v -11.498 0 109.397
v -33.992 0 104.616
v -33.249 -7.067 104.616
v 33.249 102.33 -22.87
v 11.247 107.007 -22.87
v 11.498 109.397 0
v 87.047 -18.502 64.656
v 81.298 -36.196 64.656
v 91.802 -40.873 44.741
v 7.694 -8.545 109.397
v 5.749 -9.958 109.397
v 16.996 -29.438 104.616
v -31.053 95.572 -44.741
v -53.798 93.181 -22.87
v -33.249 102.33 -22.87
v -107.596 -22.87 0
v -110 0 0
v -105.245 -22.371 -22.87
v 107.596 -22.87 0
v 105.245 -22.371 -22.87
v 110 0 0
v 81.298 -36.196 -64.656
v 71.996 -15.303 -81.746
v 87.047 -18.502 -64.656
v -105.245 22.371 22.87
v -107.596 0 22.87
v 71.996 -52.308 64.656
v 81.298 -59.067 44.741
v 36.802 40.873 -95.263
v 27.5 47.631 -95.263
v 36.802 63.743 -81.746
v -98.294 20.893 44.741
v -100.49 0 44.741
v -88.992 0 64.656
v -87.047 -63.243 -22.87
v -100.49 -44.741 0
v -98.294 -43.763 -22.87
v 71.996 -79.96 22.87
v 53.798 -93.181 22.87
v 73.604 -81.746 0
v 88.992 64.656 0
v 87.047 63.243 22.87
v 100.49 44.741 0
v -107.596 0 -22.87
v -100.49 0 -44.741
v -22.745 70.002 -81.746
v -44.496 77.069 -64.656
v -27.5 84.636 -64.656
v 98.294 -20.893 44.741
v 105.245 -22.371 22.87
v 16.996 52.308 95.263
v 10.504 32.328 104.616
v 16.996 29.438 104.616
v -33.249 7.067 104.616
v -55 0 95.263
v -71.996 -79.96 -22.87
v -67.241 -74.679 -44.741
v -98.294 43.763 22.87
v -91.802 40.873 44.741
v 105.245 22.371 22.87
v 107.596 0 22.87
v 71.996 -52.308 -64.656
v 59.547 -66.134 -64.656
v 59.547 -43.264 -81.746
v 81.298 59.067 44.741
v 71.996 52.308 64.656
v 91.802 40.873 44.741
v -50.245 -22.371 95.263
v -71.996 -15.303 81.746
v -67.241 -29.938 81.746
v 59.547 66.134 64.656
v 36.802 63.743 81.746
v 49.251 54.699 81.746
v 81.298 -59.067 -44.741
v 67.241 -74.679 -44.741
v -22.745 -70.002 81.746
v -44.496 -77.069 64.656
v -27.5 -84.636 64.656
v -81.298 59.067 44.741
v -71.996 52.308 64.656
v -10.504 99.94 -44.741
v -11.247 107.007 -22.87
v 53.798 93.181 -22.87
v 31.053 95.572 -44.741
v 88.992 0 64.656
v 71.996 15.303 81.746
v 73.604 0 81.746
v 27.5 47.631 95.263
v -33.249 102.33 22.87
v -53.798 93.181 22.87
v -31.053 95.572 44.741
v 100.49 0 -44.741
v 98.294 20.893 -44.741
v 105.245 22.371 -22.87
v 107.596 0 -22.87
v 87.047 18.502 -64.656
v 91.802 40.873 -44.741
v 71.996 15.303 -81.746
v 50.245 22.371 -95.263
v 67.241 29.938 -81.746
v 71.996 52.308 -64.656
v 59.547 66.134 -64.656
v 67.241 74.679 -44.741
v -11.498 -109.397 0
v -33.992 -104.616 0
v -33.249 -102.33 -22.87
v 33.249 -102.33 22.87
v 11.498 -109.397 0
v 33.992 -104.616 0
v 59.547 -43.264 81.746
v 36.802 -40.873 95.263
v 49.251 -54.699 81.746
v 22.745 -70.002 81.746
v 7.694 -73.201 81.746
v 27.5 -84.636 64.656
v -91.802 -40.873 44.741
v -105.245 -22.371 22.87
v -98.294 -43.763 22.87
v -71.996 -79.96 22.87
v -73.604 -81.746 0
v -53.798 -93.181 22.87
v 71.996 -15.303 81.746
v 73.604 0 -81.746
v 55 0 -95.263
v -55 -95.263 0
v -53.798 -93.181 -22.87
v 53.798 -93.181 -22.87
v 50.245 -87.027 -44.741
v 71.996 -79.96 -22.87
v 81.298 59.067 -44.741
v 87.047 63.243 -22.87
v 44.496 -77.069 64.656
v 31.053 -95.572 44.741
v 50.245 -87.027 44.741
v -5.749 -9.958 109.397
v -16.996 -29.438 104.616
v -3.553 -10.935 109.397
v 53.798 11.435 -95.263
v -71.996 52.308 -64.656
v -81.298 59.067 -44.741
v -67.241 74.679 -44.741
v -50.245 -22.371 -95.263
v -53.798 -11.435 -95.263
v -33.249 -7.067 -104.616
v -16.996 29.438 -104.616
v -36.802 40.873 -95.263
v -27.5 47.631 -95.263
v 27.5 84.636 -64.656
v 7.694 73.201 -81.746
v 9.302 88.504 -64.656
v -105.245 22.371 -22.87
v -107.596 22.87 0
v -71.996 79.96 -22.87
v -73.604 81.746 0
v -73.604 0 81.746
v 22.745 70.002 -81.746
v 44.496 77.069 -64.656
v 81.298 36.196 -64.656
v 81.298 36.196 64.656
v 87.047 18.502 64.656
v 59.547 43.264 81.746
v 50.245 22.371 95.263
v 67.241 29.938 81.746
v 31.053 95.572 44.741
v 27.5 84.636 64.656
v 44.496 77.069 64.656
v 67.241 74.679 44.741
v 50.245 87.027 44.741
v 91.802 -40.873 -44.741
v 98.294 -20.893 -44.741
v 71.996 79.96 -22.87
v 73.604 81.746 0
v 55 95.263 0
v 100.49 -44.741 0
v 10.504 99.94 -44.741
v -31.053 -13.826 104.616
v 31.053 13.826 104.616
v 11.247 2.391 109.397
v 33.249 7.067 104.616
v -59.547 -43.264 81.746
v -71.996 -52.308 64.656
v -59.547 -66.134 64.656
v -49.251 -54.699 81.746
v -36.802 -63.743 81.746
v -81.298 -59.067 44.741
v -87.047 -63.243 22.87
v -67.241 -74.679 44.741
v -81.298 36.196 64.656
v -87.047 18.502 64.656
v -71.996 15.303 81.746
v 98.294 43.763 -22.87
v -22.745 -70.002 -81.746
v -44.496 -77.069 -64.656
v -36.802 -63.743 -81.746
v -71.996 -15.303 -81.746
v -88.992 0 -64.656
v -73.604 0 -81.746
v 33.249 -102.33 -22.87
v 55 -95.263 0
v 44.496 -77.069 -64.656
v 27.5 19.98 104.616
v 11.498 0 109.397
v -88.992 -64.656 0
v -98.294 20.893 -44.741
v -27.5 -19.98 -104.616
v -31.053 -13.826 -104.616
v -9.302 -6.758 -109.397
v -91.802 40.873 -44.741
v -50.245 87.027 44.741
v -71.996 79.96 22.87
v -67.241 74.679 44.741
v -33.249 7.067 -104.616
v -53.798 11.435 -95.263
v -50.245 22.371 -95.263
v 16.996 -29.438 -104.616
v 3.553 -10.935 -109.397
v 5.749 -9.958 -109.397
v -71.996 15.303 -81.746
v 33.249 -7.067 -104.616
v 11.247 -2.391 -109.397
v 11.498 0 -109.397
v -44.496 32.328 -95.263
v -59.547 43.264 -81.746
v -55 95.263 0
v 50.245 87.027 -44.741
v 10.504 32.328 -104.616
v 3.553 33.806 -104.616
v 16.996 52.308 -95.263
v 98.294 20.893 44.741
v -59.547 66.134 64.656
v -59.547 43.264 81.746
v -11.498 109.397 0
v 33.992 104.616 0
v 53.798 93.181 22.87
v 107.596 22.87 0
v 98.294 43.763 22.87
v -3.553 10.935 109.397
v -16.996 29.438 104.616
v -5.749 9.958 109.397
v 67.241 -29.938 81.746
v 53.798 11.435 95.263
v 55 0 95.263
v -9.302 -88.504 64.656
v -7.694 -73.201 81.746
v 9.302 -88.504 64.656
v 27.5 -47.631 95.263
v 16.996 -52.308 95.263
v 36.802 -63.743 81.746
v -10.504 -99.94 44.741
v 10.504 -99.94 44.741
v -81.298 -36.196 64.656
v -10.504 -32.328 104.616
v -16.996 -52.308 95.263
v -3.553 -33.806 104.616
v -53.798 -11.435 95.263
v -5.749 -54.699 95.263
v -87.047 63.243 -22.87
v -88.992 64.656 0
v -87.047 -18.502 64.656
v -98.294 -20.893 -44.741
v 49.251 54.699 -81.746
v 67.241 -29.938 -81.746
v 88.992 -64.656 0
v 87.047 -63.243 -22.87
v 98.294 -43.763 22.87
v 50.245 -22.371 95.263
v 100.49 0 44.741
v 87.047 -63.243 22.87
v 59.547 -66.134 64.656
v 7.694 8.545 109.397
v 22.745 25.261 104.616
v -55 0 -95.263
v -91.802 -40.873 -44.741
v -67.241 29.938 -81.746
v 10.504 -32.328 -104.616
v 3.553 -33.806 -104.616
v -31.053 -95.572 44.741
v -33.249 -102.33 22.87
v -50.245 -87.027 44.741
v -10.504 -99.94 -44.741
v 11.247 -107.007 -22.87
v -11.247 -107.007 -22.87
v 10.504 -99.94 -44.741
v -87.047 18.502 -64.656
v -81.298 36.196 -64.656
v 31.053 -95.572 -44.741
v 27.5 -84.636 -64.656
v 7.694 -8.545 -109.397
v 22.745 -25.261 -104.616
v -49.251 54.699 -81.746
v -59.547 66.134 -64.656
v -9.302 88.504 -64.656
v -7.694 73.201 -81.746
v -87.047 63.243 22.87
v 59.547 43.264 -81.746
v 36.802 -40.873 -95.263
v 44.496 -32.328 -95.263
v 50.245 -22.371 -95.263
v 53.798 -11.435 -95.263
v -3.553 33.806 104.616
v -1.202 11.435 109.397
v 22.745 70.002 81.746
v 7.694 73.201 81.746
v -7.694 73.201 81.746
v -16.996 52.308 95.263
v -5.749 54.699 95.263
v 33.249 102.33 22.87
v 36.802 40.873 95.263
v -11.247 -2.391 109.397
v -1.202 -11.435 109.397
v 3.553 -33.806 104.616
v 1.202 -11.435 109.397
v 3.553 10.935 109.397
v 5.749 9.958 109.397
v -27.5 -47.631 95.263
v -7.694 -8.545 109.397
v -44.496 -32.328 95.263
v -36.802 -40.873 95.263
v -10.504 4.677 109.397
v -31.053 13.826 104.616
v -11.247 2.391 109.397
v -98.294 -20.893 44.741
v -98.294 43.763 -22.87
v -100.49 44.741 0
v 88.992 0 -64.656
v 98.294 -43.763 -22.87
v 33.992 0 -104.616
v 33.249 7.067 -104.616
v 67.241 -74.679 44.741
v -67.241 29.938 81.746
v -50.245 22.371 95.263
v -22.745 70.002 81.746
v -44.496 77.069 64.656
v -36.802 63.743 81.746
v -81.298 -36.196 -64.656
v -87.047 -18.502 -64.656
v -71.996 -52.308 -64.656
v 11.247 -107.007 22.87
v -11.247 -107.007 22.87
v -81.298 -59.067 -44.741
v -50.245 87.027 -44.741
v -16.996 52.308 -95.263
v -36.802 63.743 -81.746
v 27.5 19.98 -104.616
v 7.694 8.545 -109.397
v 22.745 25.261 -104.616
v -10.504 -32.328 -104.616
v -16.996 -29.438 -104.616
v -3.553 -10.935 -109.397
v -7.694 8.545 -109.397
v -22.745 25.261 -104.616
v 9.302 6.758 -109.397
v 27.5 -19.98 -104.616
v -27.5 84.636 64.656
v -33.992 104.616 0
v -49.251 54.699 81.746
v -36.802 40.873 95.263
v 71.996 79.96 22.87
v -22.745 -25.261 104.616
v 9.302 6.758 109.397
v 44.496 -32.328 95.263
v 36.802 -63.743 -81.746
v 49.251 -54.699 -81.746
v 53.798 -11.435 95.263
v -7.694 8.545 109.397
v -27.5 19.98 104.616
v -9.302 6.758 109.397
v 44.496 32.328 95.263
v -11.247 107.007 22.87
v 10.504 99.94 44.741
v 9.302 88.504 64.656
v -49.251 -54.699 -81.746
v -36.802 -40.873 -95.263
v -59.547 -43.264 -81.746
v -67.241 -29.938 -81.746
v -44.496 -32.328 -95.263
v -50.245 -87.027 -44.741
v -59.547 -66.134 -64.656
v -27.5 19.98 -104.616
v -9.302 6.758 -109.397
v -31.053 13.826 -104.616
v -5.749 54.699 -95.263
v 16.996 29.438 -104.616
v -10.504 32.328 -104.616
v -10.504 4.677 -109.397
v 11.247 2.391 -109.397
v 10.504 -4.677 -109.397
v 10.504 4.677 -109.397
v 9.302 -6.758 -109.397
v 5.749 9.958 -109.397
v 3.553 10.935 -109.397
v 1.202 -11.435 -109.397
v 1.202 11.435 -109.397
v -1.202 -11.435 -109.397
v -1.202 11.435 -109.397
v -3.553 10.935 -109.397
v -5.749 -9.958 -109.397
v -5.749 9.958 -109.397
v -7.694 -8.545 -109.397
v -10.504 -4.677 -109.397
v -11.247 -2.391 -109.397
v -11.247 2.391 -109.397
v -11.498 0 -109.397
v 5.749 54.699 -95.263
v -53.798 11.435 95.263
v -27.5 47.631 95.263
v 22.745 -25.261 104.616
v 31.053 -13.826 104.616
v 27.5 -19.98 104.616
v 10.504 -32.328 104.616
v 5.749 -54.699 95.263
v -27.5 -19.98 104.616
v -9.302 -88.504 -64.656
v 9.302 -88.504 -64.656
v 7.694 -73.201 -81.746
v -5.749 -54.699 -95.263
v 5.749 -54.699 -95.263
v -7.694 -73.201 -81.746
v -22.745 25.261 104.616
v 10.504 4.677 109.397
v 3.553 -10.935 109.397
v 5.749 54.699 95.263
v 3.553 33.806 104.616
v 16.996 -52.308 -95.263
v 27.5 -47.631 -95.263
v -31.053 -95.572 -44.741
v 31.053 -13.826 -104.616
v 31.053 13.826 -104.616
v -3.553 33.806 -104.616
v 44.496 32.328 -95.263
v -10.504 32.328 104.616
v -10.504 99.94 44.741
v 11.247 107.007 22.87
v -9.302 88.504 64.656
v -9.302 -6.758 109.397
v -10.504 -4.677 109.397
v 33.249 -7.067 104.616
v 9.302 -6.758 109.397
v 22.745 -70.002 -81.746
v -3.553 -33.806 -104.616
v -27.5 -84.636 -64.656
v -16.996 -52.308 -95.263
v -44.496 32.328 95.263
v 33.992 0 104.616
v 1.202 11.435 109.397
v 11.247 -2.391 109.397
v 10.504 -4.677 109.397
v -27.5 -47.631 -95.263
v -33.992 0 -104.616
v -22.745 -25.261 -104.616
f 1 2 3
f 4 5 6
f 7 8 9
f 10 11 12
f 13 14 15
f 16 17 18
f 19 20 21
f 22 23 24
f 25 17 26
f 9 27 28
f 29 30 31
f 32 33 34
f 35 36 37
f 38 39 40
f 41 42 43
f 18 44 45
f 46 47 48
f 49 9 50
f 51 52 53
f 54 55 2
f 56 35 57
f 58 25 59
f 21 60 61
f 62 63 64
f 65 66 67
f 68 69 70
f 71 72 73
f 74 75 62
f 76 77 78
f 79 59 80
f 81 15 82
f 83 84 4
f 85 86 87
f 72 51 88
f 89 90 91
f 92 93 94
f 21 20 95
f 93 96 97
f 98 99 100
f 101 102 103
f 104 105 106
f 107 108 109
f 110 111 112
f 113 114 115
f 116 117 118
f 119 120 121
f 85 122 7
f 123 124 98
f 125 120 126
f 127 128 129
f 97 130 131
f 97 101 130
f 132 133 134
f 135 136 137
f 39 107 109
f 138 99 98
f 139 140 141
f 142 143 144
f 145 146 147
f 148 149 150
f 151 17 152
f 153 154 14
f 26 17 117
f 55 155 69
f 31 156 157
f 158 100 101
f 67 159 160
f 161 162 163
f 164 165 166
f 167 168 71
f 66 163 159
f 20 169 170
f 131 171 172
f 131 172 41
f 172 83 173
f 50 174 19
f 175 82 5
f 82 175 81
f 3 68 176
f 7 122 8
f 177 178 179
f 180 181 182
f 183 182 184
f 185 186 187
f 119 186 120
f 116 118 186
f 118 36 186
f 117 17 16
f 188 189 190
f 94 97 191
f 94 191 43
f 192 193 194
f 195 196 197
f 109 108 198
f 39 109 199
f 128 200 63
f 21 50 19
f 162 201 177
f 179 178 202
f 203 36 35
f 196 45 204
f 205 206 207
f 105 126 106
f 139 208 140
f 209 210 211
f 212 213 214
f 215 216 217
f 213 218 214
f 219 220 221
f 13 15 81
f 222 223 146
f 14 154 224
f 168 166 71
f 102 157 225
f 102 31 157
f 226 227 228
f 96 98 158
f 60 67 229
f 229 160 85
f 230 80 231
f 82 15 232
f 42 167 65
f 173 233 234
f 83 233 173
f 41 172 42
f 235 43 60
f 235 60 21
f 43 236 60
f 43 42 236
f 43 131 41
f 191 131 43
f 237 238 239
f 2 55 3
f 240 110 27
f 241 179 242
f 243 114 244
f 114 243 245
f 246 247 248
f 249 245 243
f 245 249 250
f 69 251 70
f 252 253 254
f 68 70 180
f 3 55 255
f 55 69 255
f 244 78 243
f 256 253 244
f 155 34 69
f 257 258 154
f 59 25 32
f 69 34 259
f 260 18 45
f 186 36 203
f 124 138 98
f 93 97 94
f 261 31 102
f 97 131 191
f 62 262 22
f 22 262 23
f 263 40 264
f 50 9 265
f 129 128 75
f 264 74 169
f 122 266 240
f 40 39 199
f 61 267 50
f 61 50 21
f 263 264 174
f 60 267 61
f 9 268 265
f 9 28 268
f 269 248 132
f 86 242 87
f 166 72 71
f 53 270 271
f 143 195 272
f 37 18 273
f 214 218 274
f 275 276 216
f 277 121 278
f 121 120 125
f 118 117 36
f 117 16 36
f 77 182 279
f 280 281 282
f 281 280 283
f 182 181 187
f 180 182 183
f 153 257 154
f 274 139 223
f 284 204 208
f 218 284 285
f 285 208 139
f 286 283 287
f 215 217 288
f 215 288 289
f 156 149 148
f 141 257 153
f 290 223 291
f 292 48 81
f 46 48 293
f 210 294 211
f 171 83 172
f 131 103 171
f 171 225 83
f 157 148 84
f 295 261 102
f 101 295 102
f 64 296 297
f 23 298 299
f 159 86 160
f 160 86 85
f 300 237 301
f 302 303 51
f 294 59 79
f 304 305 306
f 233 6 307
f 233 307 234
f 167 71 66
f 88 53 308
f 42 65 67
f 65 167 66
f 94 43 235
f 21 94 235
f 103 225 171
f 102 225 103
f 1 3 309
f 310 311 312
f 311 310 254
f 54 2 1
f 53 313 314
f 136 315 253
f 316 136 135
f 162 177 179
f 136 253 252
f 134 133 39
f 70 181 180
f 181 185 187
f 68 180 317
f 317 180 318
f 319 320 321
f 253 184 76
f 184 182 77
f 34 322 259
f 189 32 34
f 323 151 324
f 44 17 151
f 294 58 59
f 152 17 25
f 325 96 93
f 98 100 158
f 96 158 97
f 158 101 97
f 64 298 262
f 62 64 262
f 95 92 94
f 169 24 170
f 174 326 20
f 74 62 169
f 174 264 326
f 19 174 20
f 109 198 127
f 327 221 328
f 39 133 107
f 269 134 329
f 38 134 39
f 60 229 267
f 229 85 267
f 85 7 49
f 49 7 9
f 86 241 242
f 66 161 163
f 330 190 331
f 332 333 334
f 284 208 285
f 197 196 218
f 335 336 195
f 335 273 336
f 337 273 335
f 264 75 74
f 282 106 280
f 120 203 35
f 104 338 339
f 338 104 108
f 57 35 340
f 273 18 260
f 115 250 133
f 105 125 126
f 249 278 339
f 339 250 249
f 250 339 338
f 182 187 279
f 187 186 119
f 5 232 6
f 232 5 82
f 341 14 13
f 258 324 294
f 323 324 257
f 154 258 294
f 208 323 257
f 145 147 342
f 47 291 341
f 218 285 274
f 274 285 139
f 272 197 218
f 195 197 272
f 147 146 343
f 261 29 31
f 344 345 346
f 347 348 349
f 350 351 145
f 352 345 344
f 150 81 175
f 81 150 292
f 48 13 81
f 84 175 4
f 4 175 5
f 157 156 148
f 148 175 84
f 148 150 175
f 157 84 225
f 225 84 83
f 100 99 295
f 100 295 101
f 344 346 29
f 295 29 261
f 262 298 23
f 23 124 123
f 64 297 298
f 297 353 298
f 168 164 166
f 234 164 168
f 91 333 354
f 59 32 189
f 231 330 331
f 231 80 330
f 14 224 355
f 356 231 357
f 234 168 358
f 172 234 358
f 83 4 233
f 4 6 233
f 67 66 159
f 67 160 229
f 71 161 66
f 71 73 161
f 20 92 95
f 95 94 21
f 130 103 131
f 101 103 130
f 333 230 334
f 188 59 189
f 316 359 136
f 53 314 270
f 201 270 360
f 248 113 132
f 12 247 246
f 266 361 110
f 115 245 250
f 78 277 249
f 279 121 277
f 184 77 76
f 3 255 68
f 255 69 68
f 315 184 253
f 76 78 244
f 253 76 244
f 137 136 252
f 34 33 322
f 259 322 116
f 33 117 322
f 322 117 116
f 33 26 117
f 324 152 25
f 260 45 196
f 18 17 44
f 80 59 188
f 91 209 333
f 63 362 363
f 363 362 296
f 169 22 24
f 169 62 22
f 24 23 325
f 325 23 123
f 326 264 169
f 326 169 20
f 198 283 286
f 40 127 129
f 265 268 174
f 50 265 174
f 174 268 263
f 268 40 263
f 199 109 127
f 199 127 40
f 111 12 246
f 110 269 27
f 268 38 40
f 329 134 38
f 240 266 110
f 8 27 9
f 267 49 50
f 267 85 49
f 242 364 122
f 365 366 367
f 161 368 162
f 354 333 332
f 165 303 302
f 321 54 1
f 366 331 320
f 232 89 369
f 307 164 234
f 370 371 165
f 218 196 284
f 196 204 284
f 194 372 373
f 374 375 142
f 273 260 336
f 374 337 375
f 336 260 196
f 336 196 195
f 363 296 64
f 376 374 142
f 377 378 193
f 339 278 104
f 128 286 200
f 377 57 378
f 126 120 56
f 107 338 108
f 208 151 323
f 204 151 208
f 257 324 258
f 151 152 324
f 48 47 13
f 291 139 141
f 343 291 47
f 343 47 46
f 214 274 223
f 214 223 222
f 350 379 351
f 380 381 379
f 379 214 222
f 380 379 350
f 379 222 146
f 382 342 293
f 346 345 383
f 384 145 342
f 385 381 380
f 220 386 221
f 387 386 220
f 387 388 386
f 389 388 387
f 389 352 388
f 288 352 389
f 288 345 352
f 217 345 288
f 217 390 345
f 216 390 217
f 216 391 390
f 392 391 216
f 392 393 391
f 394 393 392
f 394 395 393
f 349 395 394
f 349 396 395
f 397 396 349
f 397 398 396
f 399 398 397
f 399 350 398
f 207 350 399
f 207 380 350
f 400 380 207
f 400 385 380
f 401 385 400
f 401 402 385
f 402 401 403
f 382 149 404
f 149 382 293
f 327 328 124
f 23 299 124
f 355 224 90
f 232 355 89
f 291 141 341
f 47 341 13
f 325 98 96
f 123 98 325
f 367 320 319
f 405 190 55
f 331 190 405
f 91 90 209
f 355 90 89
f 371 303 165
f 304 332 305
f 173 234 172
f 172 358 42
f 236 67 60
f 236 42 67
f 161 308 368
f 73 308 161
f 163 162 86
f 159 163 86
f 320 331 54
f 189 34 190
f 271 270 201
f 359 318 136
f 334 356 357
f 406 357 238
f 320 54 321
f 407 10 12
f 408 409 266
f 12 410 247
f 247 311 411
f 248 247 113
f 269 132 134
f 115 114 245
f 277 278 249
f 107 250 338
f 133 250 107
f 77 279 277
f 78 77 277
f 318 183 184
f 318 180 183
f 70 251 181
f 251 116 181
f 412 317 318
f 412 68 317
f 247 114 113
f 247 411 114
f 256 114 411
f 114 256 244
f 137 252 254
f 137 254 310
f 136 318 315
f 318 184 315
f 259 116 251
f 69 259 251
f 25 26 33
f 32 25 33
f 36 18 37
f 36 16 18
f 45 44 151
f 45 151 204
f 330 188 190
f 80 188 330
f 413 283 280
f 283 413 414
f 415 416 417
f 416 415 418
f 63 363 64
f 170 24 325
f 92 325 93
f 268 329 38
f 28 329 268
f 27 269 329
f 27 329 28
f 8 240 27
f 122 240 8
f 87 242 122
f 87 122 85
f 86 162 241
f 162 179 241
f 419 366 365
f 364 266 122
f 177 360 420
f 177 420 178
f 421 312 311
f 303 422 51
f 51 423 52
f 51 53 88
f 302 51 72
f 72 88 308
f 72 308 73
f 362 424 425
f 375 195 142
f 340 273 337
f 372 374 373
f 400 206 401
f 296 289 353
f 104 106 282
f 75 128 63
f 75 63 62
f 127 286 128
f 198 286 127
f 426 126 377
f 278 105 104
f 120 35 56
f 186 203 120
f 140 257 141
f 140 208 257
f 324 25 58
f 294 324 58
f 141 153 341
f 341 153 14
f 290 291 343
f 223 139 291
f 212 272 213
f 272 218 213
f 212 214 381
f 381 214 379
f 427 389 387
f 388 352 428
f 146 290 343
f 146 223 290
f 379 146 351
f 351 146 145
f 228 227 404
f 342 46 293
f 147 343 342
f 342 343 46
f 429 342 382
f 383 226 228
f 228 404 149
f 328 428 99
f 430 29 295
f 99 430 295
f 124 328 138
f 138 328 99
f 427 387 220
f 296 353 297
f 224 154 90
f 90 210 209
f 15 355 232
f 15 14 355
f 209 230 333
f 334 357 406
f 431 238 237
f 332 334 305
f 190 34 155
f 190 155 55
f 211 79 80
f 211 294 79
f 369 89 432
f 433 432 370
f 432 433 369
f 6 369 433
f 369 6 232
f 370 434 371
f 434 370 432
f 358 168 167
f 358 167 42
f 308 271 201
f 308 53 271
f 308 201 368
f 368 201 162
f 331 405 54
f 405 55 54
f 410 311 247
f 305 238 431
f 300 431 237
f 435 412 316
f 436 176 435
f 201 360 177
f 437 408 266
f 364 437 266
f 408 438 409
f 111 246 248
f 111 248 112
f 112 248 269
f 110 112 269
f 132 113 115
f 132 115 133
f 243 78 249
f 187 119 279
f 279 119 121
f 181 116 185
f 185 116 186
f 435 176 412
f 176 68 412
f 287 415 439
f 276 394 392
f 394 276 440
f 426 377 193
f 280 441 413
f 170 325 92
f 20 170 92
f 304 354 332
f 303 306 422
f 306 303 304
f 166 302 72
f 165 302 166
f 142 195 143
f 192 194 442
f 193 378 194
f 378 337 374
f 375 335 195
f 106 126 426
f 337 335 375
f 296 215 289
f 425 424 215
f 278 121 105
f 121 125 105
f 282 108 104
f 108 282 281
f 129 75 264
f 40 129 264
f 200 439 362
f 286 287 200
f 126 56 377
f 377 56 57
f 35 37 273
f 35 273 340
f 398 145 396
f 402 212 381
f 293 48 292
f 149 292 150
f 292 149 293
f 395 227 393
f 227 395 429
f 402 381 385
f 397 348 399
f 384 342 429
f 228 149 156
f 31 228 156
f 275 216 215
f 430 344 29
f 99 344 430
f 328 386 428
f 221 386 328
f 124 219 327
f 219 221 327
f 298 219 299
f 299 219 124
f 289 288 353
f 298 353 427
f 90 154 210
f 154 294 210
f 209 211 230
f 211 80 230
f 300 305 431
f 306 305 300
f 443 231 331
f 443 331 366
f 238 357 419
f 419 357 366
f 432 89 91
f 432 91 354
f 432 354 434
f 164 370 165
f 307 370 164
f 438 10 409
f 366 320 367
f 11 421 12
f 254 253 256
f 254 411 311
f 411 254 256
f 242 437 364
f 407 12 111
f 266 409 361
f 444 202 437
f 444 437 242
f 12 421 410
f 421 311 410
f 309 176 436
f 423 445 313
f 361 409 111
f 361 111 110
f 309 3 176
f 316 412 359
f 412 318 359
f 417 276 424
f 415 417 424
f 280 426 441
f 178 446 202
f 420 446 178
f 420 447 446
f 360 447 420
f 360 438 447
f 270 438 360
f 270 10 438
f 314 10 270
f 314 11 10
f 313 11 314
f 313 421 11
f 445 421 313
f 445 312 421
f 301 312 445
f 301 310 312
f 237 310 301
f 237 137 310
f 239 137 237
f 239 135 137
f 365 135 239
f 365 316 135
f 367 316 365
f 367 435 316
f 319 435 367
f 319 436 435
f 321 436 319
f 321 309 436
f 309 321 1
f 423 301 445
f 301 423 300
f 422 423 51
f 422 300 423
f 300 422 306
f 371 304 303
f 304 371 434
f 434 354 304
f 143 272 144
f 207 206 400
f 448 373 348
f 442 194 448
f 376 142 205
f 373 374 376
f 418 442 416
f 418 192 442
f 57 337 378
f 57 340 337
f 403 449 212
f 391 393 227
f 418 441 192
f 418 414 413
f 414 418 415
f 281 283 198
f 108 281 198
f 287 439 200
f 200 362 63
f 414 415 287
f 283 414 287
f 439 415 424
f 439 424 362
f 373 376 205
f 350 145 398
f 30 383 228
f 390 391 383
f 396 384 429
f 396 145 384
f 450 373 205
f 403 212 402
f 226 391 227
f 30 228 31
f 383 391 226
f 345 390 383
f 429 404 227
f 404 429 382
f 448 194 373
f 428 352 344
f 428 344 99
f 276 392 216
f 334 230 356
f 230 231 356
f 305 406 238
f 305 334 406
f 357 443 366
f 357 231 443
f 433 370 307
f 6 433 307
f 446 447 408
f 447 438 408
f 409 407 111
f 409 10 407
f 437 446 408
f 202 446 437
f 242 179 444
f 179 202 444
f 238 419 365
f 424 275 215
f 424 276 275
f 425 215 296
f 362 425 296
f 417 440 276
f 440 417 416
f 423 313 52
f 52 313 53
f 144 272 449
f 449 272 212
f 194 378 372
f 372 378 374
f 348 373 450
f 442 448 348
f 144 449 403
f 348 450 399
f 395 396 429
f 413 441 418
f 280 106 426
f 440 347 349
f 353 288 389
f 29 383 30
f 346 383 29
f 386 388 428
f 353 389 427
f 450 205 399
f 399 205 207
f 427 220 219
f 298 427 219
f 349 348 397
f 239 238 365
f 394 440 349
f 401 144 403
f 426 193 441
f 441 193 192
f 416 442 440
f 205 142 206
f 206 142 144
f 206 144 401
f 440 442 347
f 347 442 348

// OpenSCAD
union () {
  cube ([100, 100, 100], center=true);
  sphere (r=110);
  cylinder (h=150, r=10, center=true);
}
